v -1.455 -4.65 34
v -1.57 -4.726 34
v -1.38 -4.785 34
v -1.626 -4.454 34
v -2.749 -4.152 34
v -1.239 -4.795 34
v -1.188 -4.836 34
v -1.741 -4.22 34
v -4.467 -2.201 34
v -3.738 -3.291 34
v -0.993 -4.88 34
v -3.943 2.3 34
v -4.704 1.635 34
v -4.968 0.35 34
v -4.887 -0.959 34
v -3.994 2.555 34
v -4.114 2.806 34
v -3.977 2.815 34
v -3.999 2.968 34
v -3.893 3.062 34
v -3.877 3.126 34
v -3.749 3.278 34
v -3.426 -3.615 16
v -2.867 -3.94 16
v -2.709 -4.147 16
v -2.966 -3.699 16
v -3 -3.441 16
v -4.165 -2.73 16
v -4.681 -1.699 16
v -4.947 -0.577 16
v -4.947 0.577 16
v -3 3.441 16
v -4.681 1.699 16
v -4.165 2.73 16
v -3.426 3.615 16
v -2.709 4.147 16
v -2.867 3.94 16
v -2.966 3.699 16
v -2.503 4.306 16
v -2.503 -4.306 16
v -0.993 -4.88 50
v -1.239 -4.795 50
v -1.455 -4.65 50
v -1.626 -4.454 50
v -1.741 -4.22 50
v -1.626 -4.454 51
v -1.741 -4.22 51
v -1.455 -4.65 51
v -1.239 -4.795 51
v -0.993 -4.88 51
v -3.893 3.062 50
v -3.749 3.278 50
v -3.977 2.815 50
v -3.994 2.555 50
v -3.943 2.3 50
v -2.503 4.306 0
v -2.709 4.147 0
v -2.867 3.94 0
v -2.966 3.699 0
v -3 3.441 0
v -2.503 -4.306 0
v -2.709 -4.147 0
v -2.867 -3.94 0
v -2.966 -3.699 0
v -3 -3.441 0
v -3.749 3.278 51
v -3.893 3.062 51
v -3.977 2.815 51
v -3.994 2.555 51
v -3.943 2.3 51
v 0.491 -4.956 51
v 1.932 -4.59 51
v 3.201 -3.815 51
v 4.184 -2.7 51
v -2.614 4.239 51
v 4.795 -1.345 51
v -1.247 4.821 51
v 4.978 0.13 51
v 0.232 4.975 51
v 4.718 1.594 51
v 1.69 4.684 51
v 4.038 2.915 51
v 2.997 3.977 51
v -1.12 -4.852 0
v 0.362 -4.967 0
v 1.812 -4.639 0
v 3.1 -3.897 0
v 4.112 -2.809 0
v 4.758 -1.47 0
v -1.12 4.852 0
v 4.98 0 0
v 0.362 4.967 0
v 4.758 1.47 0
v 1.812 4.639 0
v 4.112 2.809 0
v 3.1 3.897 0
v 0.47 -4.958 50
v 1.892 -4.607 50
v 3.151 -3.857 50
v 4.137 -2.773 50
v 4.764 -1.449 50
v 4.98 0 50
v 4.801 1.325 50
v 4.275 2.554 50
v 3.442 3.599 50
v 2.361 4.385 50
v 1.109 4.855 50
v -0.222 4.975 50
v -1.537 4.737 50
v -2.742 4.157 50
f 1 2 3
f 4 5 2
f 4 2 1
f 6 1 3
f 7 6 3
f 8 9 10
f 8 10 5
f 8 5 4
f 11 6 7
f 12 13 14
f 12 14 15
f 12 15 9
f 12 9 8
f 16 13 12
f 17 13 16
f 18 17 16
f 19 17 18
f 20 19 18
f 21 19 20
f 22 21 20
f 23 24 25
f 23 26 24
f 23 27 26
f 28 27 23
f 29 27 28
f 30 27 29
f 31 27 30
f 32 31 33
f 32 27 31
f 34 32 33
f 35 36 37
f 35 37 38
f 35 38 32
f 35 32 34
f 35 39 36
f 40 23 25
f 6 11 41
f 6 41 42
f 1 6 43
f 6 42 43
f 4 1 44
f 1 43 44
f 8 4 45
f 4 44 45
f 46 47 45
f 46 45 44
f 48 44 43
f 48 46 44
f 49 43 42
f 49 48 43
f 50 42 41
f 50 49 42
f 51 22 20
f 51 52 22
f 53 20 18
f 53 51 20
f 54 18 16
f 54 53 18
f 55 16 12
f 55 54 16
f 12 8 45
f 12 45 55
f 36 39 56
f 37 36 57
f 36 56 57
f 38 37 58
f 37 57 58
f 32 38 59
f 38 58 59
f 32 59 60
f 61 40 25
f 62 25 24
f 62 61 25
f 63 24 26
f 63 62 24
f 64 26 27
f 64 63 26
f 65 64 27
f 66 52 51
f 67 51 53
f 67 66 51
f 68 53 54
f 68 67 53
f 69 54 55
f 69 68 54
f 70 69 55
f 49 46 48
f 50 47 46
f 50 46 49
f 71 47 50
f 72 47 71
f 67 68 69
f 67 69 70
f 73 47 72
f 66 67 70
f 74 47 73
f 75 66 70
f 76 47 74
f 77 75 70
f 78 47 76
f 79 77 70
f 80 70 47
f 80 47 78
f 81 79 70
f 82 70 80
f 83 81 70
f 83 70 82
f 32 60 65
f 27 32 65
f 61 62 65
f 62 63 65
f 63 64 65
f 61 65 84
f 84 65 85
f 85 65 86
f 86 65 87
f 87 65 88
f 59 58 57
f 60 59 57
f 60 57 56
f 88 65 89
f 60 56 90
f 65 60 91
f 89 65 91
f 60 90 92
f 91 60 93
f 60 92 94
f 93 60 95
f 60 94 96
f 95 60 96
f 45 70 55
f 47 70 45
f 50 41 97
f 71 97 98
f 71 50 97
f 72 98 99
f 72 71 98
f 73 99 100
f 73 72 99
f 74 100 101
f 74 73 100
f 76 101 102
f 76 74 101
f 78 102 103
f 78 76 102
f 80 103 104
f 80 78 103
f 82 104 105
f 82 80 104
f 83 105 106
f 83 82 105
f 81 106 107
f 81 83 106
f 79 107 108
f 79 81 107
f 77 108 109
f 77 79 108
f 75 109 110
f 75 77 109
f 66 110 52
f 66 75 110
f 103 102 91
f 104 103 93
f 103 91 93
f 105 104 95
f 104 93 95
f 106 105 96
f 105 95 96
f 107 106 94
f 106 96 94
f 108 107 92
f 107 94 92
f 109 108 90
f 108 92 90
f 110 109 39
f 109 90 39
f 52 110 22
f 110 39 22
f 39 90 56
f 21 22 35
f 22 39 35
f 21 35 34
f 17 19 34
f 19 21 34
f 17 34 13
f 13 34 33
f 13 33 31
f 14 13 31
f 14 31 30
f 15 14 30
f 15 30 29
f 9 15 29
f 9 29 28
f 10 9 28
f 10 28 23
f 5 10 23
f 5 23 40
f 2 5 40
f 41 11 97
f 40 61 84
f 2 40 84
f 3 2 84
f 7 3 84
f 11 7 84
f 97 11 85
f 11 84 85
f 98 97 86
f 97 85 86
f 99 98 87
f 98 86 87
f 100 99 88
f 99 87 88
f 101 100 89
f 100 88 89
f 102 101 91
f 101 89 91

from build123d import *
from build123d.topology import SkipClean

# Parameters (mm, degrees)
SKETCH1_R           = 4.98
BOSS_EXTRUDE1_DEPTH = 50
CUT_EXTRUDE1_DEPTH  = 16
CUT_EXTRUDE2_START  = -16
CUT_EXTRUDE2_DEPTH  = 16
FILLET1_R           = 1
BOSS_EXTRUDE2_START = 1
BOSS_EXTRUDE2_DEPTH = 1


with BuildPart() as part:
    # Sketch1 → Boss-Extrude1 (new body)
    with BuildSketch(Plane.XY):
        Circle(SKETCH1_R)
    extrude(amount=BOSS_EXTRUDE1_DEPTH)

    # Sketch2 → Cut-Extrude1 (cut)
    with BuildSketch(Plane(origin=(0, 0, 0), x_dir=(-1, 0, 0), z_dir=(0, 0, -1))):
        Polygon((3, 37.964295833), (3, 3.974971698), (3, -3.974971698), (3, -37.964295833), (70.97864827, -37.964295833), (70.97864827, 37.964295833), align=None)
    extrude(amount=-CUT_EXTRUDE1_DEPTH, mode=Mode.SUBTRACT)

    # Sketch3 → Cut-Extrude2 (cut)
    with BuildSketch(Plane.XY.offset(50).offset(CUT_EXTRUDE2_START)):
        with BuildLine():
            Line((-1.570261684, -4.725957918), (-4.114243571, 2.805957918))
            ThreePointArc((-4.114243571, 2.805957918), (-4.718139362, -1.5936), (-1.570261684, -4.725957918))
        make_face()
    extrude(amount=CUT_EXTRUDE2_DEPTH, mode=Mode.SUBTRACT)

    # Fillet1
    fillet1_edges = [part.edges().sort_by_distance(p)[0] for p in [
        (-3, 3.974971698, 8),
        (-3, -3.974971698, 8),
        (-4.114243571, 2.805957918, 42),
        (-1.570261684, -4.725957918, 42),
    ]]
    fillet(fillet1_edges, radius=FILLET1_R)

    # Sketch4 → Boss-Extrude2 (add)
    with SkipClean():  # the faces are left unmerged after this step: merging them gives an invalid solid
        with BuildSketch(Plane.XY.offset(50).offset(BOSS_EXTRUDE2_START)):
            with BuildLine():
                Line((-3.943368861, 2.300052613), (-1.741136394, -4.220052613))
                ThreePointArc((-1.741136394, -4.220052613), (-1.455295916, -4.649929795), (-0.993145699, -4.87996533))
                ThreePointArc((-0.993145699, -4.87996533), (4.718139362, 1.5936), (-3.748702906, 3.27835729))
                ThreePointArc((-3.748702906, 3.27835729), (-3.97672335, 2.81520953), (-3.943368861, 2.300052613))
            make_face()
        extrude(amount=-BOSS_EXTRUDE2_DEPTH)


solid = part.part
